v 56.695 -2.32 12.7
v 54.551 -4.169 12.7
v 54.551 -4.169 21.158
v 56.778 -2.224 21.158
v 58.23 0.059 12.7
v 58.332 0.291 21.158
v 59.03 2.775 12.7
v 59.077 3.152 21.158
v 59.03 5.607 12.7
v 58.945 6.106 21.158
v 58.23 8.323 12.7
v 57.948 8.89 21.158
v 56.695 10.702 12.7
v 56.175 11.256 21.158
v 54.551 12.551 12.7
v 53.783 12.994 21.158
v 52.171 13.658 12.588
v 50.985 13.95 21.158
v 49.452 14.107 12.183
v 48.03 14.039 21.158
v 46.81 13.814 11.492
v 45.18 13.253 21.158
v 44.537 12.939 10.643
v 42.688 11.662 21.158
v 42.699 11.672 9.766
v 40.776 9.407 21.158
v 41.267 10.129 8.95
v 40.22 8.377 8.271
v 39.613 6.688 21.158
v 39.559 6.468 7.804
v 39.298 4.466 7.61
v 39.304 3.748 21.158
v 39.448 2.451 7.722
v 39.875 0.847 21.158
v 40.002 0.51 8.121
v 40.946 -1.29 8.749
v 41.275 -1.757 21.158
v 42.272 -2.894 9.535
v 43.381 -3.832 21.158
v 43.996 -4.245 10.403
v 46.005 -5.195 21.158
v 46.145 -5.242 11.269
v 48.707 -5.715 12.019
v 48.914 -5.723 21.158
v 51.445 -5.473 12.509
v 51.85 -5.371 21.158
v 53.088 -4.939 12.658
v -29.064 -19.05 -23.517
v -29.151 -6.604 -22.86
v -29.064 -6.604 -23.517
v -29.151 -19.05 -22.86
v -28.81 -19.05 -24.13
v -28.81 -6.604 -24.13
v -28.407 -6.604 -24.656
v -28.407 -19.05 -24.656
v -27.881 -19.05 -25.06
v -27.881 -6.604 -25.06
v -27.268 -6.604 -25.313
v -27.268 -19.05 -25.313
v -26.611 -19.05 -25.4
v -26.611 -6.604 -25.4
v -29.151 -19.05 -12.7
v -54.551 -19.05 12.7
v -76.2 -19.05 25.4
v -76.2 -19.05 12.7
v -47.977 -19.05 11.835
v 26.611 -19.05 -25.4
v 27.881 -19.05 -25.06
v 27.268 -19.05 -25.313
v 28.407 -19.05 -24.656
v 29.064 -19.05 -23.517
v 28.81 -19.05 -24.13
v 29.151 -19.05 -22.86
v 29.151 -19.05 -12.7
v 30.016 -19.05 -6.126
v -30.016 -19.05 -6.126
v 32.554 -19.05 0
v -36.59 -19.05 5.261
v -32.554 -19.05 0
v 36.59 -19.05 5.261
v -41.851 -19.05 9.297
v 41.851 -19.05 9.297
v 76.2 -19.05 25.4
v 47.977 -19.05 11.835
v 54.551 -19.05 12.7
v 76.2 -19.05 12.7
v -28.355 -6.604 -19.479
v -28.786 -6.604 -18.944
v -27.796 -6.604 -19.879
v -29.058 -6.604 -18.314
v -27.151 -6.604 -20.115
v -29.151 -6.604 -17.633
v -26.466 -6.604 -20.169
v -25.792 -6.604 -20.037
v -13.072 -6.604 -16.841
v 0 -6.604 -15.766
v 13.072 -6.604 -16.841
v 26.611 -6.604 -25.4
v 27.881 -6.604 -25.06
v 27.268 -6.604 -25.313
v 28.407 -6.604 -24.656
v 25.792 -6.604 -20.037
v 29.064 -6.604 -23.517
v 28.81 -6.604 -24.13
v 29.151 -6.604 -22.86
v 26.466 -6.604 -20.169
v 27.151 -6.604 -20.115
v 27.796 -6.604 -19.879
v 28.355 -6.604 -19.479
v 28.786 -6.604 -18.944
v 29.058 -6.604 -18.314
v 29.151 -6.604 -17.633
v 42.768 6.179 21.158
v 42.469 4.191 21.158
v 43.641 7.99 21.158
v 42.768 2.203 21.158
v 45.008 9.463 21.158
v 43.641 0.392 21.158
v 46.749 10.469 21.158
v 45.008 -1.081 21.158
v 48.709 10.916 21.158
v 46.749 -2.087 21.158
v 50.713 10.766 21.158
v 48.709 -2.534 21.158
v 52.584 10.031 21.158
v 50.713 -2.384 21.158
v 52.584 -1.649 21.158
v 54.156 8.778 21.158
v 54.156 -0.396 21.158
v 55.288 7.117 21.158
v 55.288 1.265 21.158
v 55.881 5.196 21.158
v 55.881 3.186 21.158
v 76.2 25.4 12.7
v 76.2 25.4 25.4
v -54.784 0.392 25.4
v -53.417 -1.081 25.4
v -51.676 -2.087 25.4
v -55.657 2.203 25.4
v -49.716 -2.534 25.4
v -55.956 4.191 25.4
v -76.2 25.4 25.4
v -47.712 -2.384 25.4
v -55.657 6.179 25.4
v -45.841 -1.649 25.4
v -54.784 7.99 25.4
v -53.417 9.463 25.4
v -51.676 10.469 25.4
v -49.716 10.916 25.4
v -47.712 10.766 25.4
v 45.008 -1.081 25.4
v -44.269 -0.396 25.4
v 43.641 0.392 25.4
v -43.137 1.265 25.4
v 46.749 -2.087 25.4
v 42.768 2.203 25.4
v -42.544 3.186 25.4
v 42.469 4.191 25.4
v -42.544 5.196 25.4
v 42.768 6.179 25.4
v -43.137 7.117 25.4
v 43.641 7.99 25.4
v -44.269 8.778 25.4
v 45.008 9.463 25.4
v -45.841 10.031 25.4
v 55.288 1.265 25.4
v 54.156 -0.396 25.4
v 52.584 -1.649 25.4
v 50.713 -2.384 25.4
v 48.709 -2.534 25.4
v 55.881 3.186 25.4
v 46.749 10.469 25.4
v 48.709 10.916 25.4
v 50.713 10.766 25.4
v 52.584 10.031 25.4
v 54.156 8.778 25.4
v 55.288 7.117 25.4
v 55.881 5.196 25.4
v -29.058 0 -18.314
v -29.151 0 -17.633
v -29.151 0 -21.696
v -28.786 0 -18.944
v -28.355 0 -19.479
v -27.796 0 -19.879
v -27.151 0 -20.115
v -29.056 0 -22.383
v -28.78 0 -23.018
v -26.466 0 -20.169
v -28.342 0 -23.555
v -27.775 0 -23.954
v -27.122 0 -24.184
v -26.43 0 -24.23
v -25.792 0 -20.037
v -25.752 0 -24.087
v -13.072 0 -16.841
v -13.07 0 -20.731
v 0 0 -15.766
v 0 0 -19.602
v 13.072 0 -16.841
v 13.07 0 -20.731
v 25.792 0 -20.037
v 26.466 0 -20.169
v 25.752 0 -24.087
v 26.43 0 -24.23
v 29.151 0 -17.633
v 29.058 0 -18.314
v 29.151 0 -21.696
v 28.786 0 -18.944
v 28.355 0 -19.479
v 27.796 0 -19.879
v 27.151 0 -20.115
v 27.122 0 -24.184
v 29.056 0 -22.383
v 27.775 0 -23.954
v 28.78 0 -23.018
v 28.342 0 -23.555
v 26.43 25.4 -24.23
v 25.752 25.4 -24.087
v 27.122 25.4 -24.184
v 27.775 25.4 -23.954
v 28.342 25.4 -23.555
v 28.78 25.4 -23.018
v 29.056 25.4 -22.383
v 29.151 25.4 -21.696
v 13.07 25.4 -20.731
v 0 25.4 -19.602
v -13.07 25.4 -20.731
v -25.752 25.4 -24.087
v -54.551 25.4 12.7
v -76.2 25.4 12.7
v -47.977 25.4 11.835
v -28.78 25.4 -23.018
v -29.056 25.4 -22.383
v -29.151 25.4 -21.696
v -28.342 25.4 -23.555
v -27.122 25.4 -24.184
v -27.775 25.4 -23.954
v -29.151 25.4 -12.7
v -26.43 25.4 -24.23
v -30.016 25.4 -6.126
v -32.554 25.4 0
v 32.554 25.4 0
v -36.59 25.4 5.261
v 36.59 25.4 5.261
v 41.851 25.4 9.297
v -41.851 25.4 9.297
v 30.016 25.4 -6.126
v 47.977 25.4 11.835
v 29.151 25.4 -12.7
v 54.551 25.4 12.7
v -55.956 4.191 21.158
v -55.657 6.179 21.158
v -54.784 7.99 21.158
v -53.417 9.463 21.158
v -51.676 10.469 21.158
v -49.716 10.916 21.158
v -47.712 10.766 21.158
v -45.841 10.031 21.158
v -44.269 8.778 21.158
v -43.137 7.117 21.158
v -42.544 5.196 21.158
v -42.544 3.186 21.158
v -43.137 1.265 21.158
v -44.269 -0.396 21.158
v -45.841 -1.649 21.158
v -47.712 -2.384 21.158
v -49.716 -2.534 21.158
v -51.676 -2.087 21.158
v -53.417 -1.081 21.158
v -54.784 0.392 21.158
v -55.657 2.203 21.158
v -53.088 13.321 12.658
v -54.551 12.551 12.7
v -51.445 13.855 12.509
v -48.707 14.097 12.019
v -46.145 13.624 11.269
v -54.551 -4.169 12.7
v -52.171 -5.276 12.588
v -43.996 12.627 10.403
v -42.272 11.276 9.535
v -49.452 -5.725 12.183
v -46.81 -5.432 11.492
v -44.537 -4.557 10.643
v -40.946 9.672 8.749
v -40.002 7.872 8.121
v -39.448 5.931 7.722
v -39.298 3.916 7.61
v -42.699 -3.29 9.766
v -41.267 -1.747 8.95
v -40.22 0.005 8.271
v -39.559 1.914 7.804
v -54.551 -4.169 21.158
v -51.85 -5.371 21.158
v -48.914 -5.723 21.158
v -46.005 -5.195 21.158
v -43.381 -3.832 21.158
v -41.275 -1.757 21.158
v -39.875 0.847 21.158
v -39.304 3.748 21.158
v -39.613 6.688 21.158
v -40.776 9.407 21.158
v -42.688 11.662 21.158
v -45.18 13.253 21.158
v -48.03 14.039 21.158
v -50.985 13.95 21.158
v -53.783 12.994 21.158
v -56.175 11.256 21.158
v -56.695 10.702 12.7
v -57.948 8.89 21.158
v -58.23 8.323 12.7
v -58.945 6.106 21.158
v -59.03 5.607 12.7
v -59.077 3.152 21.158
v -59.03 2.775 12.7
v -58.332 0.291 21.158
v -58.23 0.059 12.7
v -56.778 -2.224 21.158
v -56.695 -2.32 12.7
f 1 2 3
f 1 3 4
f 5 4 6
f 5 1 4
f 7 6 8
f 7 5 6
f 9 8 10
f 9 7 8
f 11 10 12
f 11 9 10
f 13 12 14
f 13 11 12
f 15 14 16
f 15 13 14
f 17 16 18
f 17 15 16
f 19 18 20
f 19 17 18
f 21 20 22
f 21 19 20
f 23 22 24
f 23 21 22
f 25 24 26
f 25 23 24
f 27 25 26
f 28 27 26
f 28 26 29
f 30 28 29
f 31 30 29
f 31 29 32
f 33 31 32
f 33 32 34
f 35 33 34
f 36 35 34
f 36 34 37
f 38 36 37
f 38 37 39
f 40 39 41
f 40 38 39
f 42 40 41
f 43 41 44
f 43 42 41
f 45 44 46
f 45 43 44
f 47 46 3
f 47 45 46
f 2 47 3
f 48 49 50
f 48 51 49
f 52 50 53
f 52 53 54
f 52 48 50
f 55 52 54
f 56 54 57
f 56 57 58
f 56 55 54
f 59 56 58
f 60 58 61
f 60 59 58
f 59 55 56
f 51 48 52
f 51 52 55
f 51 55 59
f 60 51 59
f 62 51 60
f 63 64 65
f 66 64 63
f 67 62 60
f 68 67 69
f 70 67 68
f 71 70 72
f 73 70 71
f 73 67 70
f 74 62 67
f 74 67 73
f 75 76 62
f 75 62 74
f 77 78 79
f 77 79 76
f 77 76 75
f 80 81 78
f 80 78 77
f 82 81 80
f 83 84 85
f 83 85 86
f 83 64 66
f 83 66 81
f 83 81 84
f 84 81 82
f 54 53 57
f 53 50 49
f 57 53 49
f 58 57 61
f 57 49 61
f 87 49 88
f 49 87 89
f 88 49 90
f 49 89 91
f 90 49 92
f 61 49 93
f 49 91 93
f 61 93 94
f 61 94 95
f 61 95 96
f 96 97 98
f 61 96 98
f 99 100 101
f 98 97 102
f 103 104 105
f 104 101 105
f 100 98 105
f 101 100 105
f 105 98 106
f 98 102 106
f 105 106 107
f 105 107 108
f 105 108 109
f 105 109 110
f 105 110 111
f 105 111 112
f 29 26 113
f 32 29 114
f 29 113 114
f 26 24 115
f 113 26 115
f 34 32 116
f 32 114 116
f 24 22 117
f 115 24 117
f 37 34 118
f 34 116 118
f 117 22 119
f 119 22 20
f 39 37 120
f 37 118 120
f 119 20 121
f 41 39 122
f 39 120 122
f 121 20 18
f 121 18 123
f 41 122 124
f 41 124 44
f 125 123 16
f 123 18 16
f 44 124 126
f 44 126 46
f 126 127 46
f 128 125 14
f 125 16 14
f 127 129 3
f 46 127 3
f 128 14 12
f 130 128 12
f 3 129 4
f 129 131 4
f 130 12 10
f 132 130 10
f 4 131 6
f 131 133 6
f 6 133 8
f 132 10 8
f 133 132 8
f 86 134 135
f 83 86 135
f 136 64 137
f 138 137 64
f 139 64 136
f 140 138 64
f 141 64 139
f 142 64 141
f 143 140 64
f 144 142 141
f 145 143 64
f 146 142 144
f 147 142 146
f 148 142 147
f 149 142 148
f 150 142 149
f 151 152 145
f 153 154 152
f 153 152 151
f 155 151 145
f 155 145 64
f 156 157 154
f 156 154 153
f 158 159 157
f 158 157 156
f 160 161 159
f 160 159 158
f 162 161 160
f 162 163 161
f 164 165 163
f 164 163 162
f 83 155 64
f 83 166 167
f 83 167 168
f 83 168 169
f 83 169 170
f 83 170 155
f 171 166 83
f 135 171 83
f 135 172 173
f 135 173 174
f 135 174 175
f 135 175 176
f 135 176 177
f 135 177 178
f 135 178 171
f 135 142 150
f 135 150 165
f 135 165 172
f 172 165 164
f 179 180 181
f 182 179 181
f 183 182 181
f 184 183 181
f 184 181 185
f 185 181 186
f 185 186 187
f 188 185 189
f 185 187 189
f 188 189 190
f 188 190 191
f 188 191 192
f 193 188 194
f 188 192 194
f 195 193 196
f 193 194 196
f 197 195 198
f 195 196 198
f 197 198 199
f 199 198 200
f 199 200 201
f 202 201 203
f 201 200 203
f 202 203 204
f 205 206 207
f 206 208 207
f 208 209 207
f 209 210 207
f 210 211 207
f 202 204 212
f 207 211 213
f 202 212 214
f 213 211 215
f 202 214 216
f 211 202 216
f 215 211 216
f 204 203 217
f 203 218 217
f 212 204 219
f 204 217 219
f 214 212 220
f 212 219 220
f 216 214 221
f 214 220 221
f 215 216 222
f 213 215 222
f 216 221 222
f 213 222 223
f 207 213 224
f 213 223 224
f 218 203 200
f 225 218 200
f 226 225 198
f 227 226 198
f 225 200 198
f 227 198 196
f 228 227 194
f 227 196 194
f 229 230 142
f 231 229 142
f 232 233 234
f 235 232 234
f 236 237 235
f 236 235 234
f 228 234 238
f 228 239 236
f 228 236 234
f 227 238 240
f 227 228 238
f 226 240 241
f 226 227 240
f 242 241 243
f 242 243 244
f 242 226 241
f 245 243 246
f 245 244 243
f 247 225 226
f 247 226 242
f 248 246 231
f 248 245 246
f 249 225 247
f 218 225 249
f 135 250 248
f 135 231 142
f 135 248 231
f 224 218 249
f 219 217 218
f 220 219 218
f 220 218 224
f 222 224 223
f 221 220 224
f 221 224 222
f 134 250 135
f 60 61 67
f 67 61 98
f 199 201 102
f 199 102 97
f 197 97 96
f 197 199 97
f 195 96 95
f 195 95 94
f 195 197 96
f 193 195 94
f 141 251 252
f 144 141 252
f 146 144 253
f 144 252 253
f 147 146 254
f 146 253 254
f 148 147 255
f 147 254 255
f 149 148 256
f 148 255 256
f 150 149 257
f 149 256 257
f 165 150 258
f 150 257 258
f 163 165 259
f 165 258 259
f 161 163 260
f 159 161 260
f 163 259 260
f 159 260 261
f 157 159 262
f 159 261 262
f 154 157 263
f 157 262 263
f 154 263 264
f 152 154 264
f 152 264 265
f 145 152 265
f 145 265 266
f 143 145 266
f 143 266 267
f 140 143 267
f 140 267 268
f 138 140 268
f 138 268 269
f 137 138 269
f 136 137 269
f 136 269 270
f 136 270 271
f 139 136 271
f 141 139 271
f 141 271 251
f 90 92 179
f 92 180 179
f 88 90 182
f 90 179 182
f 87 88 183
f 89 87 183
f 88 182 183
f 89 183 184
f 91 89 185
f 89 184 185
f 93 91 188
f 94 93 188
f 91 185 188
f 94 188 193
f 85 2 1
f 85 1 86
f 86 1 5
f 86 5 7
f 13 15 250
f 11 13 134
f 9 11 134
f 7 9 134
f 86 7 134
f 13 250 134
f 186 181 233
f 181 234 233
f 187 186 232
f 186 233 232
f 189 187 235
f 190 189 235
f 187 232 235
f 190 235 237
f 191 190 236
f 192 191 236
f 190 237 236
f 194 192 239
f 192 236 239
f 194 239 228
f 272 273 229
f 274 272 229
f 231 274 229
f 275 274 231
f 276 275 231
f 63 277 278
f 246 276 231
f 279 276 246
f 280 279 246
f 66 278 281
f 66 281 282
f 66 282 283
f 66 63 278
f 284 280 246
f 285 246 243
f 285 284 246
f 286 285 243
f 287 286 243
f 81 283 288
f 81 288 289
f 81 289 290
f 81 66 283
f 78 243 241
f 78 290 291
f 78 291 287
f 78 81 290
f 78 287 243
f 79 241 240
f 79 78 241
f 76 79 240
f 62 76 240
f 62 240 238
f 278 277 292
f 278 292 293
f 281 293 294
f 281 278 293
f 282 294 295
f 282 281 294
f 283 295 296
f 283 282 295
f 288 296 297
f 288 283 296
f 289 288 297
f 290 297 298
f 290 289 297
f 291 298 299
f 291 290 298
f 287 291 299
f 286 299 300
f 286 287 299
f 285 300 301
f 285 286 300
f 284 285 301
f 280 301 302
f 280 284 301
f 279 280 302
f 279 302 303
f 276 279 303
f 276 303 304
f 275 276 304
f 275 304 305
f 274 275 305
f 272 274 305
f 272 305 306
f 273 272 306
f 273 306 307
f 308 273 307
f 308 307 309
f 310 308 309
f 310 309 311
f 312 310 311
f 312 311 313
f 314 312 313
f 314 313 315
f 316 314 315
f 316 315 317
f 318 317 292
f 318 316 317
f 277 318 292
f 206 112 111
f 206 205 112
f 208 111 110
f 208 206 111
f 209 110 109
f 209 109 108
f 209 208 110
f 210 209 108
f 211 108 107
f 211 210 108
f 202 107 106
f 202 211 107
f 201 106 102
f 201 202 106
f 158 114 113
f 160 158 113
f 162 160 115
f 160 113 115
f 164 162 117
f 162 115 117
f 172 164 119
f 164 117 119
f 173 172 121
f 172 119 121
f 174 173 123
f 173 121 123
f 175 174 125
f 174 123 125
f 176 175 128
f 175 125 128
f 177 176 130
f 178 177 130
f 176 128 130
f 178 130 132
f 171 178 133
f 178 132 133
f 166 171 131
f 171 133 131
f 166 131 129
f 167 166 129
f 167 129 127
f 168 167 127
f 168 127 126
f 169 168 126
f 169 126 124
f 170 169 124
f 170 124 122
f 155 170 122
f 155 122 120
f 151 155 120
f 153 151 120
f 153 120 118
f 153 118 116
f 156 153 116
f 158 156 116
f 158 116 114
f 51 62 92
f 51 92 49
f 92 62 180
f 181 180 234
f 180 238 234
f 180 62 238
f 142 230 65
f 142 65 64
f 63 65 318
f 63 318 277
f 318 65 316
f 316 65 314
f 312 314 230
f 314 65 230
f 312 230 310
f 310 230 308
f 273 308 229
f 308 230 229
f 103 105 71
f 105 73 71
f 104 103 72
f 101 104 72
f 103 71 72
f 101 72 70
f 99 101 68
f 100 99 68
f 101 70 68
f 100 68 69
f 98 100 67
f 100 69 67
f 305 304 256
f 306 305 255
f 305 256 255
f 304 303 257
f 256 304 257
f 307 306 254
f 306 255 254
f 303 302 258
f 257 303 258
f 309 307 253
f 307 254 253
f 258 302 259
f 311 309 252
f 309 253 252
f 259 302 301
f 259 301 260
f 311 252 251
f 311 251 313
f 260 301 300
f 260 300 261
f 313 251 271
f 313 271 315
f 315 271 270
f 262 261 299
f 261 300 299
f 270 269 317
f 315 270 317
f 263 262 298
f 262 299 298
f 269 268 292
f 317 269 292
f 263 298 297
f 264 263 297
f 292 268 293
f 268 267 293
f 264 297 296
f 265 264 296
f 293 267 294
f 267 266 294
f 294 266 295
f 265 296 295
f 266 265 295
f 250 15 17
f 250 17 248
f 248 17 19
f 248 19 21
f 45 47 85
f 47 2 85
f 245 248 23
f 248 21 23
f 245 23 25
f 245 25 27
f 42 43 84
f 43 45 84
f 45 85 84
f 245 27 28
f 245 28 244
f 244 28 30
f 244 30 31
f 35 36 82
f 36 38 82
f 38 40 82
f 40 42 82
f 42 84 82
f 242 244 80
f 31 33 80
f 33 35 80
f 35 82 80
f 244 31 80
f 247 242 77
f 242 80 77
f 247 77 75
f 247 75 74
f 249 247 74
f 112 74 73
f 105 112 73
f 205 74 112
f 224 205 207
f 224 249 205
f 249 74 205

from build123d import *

# Parameters (mm, degrees)
BOSS_EXTRUDE1_DEPTH     = 25.4
BOSS_EXTRUDE2_DEPTH     = 6.604
SKETCH3_W               = 152.4
SKETCH3_H               = 50.8
BOSS_EXTRUDE3_DEPTH     = 12.446
SKETCH5_W               = 47.049242613
SKETCH5_H               = 38.1
CUT_EXTRUDE1_DEPTH      = 92.800885072
FILLET1_R               = 2.54
FILLET2_R               = 25.4
CUT_EXTRUDE2_DEPTH      = 8.4582
CUT_EXTRUDE2_DEPTH_BACK = 85.242269675
CUT_EXTRUDE2_START      = 12.7
SKETCH6_R               = 9.9187
SKETCH7_R               = 6.7437
CUT_EXTRUDE3_DEPTH      = 93.840002113


with BuildPart() as part:
    # Sketch1 → Boss-Extrude1 (new body)
    with BuildSketch(Plane(origin=(0, 0, 0), x_dir=(1, 0, 0), z_dir=(0, 1, 0))):
        with BuildLine():
            Line((76.2, -25.4), (76.2, 25.4))
            Line((76.2, 25.4), (29.150757387, 25.4))
            ThreePointArc((29.150757387, 25.4), (0, 19.601553837), (-29.150757387, 25.4))
            Line((-29.150757387, 25.4), (-76.2, 25.4))
            Line((-76.2, 25.4), (-76.2, -25.4))
            Line((-76.2, -25.4), (76.2, -25.4))
        make_face()
    extrude(amount=BOSS_EXTRUDE1_DEPTH)

    # Sketch2 → Boss-Extrude2 (add)
    with BuildSketch(Plane.XZ):
        with BuildLine():
            Line((-76.2, 25.4), (76.2, 25.4))
            Line((76.2, 25.4), (76.2, -21.59))
            Line((76.2, -21.59), (29.966893046, -21.59))
            ThreePointArc((29.966893046, -21.59), (0, -15.766153837), (-29.966893046, -21.59))
            Line((-29.966893046, -21.59), (-76.2, -21.59))
            Line((-76.2, -21.59), (-76.2, 25.4))
        make_face()
    extrude(amount=BOSS_EXTRUDE2_DEPTH)

    # Sketch3 → Boss-Extrude3 (add)
    with BuildSketch(Plane.XZ.offset(6.604)):
        Rectangle(SKETCH3_W, SKETCH3_H)
    extrude(amount=BOSS_EXTRUDE3_DEPTH)

    # Sketch5 → Cut-Extrude1 (cut, through all)
    with BuildSketch(Plane(origin=(0, 25.4, 0), x_dir=(1, 0, 0), z_dir=(0, 1, 0))):
        with Locations((-52.675378694, 6.35)):
            Rectangle(SKETCH5_W, SKETCH5_H)
        with Locations((52.675378694, 6.35)):
            Rectangle(SKETCH5_W, SKETCH5_H)
    extrude(amount=-CUT_EXTRUDE1_DEPTH, mode=Mode.SUBTRACT)

    # Fillet1
    fillet1_edges = [part.edges().sort_by_distance(p)[0] for p in [
        (29.150757387, 12.7, -25.4),
        (-29.150757387, 12.7, -25.4),
        (-29.150757387, -12.827, -25.4),
        (-29.150757387, -3.302, -21.265527456),
        (29.150757387, -12.827, -25.4),
        (29.150757387, -3.302, -21.265527456),
    ]]
    fillet(fillet1_edges, radius=FILLET1_R)

    # Fillet2
    fillet2_edges = [part.edges().sort_by_distance(p)[0] for p in [
        (-29.150757387, 3.175, 12.7),
        (29.150757387, 3.175, 12.7),
    ]]
    fillet(fillet2_edges, radius=FILLET2_R)

    # Sketch6 → Cut-Extrude2 (cut, two sides: drawn at the far end of the back side and taken through both)
    with BuildSketch(Plane.XY.offset(CUT_EXTRUDE2_START - CUT_EXTRUDE2_DEPTH_BACK)):
        with Locations(Location((49.2125, 4.191, 0), (0, 0, 302.561278337))):
            Circle(SKETCH6_R)
        with Locations(Location((-49.2125, 4.191, 0), (0, 0, 237.438721663))):
            Circle(SKETCH6_R)
    extrude(amount=CUT_EXTRUDE2_DEPTH + CUT_EXTRUDE2_DEPTH_BACK, mode=Mode.SUBTRACT)

    # Sketch7 → Cut-Extrude3 (cut, through all)
    with BuildSketch(Plane(origin=(0, 0, 21.1582), x_dir=(-1, 0, 0), z_dir=(0, 0, -1))):
        with Locations((-49.2125, 4.191)):
            Circle(SKETCH7_R)
        with Locations((49.2125, 4.191)):
            Circle(SKETCH7_R)
    extrude(amount=-CUT_EXTRUDE3_DEPTH, mode=Mode.SUBTRACT)


solid = part.part
